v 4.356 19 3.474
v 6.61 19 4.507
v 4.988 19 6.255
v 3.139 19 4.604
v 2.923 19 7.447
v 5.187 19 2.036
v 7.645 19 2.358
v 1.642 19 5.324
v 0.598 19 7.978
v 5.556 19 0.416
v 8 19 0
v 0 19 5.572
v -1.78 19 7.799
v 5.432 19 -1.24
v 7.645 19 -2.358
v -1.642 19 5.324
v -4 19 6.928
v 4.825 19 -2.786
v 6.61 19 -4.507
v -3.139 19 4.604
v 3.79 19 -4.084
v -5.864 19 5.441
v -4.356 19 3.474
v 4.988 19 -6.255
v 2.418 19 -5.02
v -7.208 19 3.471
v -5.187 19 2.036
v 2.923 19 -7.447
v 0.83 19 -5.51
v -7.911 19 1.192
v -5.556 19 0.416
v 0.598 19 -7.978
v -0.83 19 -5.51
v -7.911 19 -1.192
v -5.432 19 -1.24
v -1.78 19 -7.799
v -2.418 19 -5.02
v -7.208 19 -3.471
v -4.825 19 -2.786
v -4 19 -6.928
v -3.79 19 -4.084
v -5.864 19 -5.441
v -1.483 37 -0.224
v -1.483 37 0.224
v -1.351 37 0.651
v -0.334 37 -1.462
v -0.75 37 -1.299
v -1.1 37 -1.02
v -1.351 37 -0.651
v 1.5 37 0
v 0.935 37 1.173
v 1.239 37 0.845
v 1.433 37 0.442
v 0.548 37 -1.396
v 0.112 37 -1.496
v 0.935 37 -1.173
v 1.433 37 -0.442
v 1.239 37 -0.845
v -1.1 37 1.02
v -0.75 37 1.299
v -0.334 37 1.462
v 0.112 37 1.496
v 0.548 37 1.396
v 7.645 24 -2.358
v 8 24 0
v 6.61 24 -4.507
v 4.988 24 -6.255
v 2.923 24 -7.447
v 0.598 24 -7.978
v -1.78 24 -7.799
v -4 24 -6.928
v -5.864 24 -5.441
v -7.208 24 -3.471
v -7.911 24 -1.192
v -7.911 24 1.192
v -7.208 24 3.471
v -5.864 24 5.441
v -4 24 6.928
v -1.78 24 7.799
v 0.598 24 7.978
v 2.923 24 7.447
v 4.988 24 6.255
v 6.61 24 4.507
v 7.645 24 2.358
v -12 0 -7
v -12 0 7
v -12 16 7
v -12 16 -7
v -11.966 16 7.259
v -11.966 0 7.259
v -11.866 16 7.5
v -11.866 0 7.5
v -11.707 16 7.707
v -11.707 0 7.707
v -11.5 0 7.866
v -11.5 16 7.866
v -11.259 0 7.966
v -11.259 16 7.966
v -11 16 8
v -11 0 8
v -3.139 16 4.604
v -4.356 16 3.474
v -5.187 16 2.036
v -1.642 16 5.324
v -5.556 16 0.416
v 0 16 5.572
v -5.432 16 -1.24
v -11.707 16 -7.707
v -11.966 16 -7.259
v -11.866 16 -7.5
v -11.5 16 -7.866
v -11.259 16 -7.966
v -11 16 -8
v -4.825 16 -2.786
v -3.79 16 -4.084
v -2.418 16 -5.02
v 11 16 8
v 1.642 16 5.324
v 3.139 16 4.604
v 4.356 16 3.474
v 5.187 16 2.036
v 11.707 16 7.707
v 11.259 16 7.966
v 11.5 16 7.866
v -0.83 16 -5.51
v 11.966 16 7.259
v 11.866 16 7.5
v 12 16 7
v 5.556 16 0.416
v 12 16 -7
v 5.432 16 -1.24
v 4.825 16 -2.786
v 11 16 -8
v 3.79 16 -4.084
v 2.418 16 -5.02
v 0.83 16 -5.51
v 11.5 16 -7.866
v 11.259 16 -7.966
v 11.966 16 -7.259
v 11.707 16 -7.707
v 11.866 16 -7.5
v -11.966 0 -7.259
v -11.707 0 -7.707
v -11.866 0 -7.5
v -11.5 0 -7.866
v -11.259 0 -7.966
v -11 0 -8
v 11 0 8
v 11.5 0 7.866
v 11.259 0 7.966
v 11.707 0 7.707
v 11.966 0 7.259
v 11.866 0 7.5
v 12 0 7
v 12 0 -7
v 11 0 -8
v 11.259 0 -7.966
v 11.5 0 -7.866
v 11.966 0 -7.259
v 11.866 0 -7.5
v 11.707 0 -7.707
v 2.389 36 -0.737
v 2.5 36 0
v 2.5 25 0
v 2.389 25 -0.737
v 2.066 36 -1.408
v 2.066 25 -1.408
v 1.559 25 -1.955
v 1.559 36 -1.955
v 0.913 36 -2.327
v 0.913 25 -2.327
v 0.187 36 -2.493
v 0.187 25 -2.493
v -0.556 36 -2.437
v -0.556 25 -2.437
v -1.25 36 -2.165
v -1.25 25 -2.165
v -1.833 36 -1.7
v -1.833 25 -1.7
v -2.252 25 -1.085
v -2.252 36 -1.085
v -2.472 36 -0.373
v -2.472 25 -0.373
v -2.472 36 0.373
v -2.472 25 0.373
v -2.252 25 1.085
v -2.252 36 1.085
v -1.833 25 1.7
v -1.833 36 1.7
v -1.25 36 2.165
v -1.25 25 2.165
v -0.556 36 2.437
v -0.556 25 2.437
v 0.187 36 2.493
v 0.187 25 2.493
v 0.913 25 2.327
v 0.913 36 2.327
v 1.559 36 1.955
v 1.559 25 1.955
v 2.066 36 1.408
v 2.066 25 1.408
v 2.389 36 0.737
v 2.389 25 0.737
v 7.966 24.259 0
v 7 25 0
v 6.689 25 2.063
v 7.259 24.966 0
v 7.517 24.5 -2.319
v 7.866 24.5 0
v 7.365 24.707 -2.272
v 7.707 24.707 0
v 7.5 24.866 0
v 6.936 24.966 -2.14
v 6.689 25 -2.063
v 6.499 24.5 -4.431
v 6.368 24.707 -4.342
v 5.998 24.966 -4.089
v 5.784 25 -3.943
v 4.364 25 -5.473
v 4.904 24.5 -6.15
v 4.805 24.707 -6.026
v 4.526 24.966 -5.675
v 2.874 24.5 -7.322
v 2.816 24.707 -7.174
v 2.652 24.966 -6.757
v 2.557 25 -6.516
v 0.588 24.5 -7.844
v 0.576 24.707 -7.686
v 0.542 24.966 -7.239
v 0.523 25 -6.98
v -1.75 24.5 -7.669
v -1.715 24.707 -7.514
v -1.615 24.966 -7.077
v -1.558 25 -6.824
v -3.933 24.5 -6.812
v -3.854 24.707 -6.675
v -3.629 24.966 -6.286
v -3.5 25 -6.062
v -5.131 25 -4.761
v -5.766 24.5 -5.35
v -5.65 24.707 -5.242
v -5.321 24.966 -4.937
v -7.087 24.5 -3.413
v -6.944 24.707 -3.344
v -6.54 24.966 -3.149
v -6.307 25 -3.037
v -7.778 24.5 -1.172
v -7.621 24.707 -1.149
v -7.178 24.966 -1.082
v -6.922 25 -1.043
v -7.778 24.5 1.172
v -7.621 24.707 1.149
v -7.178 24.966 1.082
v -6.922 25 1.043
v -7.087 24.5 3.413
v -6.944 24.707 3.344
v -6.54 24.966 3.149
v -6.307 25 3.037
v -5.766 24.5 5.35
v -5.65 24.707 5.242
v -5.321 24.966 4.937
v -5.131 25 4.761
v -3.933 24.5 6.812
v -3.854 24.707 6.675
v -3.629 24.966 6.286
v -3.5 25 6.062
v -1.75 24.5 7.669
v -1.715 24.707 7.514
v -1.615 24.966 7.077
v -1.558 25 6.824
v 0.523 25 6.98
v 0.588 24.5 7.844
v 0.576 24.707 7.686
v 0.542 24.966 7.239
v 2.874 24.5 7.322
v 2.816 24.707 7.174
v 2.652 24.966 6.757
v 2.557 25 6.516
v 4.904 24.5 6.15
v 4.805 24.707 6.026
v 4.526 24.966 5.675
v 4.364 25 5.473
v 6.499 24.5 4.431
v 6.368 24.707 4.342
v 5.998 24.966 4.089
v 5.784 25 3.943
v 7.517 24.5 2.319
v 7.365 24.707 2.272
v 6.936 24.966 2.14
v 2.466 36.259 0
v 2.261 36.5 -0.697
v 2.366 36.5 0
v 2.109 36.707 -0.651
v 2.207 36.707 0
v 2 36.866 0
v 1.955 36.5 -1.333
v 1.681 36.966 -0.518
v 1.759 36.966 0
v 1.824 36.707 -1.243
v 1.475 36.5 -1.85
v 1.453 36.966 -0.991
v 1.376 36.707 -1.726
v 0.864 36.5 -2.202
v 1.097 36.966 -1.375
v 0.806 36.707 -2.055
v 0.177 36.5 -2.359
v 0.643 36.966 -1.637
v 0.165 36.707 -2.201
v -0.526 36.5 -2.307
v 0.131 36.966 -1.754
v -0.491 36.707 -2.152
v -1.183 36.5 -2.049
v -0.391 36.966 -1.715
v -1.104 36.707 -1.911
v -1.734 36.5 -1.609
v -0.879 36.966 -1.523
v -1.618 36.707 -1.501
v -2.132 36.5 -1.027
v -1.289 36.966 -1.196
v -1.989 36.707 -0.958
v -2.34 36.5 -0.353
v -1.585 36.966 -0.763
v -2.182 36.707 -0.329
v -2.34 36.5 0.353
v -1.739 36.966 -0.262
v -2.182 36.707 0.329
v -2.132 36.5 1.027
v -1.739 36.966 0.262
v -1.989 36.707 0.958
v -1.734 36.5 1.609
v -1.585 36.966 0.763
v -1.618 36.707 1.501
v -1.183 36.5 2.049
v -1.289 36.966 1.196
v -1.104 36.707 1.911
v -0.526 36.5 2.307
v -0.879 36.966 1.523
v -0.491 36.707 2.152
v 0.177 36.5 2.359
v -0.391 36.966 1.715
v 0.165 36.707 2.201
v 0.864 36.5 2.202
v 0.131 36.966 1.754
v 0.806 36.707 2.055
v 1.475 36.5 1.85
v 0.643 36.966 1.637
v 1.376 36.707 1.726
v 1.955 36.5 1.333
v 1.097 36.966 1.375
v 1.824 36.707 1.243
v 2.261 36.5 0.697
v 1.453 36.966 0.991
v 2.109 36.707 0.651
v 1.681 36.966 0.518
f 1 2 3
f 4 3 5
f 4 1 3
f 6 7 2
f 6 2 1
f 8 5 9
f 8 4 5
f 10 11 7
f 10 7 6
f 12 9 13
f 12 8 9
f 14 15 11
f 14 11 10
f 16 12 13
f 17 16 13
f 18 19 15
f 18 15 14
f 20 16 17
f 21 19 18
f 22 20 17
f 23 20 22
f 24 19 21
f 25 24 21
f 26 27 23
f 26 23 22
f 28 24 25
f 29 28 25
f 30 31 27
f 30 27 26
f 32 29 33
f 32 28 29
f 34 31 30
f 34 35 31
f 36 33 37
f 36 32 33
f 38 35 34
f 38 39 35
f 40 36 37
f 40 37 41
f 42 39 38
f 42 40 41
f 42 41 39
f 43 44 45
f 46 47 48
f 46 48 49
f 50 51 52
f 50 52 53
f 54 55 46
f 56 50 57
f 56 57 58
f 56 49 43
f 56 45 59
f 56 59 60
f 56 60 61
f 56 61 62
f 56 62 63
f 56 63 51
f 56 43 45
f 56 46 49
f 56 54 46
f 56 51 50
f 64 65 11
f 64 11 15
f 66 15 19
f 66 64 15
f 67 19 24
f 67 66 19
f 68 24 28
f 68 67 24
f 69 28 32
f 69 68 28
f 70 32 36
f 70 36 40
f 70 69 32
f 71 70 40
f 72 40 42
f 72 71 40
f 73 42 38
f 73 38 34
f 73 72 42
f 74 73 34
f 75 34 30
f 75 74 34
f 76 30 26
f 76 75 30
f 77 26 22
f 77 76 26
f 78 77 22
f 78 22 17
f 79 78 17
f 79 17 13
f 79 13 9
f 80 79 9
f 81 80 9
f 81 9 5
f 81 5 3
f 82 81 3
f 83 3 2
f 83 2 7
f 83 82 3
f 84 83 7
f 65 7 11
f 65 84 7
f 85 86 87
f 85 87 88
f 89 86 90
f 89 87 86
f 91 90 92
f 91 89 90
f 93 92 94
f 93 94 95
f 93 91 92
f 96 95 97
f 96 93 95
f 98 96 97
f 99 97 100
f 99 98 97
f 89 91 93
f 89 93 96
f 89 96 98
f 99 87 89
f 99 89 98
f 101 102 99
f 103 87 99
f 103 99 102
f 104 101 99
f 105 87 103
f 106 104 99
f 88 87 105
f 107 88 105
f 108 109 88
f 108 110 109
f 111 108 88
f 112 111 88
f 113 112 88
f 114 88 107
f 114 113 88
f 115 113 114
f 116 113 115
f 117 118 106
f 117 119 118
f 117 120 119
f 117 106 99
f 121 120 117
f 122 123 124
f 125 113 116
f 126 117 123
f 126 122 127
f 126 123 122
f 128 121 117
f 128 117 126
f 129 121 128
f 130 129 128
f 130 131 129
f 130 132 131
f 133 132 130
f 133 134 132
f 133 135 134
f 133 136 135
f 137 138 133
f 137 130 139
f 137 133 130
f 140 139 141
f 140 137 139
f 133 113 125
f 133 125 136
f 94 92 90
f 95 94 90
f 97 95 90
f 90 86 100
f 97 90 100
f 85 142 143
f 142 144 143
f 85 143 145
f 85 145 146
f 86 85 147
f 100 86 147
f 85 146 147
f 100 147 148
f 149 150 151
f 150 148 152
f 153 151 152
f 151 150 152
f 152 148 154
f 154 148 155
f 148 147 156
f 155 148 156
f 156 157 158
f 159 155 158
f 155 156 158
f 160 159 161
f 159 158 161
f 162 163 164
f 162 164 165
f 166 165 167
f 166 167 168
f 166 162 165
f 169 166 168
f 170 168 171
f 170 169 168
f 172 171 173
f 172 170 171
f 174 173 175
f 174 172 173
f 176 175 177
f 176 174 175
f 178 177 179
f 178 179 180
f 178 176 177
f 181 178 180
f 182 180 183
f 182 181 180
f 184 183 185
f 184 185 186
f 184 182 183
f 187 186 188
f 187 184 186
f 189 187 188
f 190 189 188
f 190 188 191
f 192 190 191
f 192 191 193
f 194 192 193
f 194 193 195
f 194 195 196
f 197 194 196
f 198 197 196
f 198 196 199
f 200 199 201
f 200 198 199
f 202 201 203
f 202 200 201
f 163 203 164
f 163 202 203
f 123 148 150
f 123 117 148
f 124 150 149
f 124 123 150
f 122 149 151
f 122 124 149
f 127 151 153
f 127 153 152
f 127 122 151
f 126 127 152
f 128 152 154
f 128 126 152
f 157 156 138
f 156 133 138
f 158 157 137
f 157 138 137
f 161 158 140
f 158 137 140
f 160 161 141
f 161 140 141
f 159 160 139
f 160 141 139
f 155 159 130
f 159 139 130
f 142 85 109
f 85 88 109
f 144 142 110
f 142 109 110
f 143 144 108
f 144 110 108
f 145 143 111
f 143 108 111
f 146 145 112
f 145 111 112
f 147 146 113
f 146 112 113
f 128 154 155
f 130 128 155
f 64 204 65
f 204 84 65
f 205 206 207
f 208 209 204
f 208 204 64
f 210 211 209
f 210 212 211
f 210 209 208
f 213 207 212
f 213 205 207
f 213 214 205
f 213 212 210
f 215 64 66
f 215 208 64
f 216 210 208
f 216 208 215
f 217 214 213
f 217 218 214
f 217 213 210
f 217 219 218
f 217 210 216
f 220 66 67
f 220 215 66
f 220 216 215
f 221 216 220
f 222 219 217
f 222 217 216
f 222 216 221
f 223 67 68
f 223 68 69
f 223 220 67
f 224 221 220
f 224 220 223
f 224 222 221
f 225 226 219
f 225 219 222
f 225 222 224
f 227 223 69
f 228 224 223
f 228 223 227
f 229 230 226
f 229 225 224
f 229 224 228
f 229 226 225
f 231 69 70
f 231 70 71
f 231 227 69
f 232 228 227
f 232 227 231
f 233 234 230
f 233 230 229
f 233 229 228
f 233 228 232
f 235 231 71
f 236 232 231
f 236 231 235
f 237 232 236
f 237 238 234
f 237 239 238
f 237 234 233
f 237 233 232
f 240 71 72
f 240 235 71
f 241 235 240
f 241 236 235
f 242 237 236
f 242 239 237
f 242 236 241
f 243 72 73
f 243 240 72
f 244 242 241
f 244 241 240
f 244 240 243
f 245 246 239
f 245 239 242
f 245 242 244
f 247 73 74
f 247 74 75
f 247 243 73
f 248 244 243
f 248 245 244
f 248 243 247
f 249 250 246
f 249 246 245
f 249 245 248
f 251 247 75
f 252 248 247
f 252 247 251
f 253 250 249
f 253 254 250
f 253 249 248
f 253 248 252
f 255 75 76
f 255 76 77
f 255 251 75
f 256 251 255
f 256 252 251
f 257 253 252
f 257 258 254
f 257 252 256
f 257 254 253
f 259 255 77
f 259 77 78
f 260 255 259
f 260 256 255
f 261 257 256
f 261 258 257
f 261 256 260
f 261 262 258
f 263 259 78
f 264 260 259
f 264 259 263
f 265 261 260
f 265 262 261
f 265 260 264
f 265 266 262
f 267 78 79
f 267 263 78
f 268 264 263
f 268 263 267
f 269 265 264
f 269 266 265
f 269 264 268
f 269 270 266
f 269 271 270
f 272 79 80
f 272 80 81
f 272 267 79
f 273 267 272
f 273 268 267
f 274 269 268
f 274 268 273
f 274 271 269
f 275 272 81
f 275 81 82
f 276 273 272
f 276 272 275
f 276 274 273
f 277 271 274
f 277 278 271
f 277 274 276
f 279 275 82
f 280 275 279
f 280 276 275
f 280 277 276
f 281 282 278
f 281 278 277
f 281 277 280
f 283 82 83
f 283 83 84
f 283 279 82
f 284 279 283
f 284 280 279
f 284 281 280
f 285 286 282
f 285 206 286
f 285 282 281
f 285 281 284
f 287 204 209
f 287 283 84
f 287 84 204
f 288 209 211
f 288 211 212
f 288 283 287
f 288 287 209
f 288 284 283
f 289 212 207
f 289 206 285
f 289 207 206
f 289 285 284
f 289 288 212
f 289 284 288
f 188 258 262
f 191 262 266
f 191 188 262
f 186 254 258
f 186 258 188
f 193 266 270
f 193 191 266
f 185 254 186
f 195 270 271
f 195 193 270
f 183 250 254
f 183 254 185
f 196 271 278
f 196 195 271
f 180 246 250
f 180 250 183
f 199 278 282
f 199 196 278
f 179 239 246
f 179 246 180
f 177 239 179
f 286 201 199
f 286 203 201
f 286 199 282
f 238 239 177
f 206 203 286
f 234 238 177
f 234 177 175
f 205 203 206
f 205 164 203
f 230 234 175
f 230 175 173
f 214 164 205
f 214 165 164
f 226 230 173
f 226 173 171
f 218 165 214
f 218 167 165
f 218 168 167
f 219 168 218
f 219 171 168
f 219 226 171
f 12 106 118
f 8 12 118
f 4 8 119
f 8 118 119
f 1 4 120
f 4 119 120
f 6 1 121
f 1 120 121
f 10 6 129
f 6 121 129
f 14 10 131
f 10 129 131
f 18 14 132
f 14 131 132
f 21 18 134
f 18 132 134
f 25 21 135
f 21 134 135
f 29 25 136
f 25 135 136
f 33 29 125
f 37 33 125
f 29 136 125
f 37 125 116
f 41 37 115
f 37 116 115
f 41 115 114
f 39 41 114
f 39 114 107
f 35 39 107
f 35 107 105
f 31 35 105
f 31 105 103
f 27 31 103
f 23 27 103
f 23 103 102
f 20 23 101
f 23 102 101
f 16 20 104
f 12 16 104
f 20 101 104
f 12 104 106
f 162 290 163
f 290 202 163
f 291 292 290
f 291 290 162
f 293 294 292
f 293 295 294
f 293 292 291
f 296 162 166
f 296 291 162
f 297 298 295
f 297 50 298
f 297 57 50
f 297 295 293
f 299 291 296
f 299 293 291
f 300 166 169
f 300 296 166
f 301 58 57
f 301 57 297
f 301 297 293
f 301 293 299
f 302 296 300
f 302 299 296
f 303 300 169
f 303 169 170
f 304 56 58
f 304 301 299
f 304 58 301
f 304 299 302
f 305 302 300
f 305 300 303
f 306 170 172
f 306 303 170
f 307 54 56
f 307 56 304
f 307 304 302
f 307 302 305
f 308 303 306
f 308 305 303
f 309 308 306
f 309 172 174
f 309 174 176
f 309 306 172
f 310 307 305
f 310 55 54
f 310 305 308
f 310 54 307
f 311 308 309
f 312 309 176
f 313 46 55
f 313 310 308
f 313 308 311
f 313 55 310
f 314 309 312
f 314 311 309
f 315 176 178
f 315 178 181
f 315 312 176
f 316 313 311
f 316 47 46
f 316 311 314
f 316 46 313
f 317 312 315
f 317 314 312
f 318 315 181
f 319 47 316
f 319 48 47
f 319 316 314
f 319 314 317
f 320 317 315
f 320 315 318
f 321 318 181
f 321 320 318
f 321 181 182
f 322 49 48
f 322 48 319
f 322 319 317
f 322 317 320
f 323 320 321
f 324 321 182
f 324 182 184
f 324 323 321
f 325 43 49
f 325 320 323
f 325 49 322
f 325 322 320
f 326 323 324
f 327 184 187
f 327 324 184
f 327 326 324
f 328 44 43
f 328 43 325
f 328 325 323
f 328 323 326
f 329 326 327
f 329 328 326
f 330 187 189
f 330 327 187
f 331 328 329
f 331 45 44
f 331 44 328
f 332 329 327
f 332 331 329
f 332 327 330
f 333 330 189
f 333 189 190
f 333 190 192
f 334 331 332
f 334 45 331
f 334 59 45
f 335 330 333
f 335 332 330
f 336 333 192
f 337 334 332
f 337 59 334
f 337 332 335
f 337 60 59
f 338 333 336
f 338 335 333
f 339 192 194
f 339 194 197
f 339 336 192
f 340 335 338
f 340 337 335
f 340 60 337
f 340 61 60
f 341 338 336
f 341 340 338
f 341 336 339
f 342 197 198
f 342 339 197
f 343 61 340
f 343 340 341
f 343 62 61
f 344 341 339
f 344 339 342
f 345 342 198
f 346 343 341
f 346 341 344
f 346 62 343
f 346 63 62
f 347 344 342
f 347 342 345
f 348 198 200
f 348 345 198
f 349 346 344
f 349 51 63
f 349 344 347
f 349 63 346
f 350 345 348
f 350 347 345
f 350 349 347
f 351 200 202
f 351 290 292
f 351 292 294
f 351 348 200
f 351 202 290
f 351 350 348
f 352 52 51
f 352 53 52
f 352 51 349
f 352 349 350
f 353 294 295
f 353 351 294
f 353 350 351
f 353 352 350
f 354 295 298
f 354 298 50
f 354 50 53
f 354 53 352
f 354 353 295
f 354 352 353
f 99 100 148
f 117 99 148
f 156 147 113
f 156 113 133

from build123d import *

# Parameters (mm, degrees)
SKETCH1_W           = 24
SKETCH1_H           = 16
BOSS_EXTRUDE1_DEPTH = 16
SKETCH2_R           = 5.571856639
BOSS_EXTRUDE2_DEPTH = 3
FILLET1_R           = 1
FILLET2_R           = 1
FILLET3_R           = 1


with BuildPart() as part:
    # Sketch1 → Boss-Extrude1 (new body)
    with BuildSketch(Plane(origin=(0, 0, 0), x_dir=(1, 0, 0), z_dir=(0, 1, 0))):
        Rectangle(SKETCH1_W, SKETCH1_H)
    extrude(amount=BOSS_EXTRUDE1_DEPTH)

    # Sketch2 → Boss-Extrude2 (add)
    with BuildSketch(Plane(origin=(0, 16, 0), x_dir=(1, 0, 0), z_dir=(0, 1, 0))):
        with Locations(Location((0, 0, 0), (0, 0, 270))):
            Circle(SKETCH2_R)
    extrude(amount=BOSS_EXTRUDE2_DEPTH)

    # Sketch4 → Revolve1 (revolve)
    with BuildSketch(Plane.XY):
        Polygon((0, 19), (8, 19), (8, 25), (2.5, 25), (2.5, 37), (0, 37), align=None)
    revolve(axis=Axis((0, 0, 0), (0, 1, 0)))

    # Fillet1
    fillet1_edges = [part.edges().sort_by_distance(p)[0] for p in [
        (-8, 25, 0),
    ]]
    fillet(fillet1_edges, radius=FILLET1_R)

    # Fillet2
    fillet2_edges = [part.edges().sort_by_distance(p)[0] for p in [
        (-2.5, 37, 0),
    ]]
    fillet(fillet2_edges, radius=FILLET2_R)

    # Fillet3
    fillet3_edges = [part.edges().sort_by_distance(p)[0] for p in [
        (12, 8, 8),
        (-12, 8, 8),
        (-12, 8, -8),
        (12, 8, -8),
    ]]
    fillet(fillet3_edges, radius=FILLET3_R)


solid = part.part
